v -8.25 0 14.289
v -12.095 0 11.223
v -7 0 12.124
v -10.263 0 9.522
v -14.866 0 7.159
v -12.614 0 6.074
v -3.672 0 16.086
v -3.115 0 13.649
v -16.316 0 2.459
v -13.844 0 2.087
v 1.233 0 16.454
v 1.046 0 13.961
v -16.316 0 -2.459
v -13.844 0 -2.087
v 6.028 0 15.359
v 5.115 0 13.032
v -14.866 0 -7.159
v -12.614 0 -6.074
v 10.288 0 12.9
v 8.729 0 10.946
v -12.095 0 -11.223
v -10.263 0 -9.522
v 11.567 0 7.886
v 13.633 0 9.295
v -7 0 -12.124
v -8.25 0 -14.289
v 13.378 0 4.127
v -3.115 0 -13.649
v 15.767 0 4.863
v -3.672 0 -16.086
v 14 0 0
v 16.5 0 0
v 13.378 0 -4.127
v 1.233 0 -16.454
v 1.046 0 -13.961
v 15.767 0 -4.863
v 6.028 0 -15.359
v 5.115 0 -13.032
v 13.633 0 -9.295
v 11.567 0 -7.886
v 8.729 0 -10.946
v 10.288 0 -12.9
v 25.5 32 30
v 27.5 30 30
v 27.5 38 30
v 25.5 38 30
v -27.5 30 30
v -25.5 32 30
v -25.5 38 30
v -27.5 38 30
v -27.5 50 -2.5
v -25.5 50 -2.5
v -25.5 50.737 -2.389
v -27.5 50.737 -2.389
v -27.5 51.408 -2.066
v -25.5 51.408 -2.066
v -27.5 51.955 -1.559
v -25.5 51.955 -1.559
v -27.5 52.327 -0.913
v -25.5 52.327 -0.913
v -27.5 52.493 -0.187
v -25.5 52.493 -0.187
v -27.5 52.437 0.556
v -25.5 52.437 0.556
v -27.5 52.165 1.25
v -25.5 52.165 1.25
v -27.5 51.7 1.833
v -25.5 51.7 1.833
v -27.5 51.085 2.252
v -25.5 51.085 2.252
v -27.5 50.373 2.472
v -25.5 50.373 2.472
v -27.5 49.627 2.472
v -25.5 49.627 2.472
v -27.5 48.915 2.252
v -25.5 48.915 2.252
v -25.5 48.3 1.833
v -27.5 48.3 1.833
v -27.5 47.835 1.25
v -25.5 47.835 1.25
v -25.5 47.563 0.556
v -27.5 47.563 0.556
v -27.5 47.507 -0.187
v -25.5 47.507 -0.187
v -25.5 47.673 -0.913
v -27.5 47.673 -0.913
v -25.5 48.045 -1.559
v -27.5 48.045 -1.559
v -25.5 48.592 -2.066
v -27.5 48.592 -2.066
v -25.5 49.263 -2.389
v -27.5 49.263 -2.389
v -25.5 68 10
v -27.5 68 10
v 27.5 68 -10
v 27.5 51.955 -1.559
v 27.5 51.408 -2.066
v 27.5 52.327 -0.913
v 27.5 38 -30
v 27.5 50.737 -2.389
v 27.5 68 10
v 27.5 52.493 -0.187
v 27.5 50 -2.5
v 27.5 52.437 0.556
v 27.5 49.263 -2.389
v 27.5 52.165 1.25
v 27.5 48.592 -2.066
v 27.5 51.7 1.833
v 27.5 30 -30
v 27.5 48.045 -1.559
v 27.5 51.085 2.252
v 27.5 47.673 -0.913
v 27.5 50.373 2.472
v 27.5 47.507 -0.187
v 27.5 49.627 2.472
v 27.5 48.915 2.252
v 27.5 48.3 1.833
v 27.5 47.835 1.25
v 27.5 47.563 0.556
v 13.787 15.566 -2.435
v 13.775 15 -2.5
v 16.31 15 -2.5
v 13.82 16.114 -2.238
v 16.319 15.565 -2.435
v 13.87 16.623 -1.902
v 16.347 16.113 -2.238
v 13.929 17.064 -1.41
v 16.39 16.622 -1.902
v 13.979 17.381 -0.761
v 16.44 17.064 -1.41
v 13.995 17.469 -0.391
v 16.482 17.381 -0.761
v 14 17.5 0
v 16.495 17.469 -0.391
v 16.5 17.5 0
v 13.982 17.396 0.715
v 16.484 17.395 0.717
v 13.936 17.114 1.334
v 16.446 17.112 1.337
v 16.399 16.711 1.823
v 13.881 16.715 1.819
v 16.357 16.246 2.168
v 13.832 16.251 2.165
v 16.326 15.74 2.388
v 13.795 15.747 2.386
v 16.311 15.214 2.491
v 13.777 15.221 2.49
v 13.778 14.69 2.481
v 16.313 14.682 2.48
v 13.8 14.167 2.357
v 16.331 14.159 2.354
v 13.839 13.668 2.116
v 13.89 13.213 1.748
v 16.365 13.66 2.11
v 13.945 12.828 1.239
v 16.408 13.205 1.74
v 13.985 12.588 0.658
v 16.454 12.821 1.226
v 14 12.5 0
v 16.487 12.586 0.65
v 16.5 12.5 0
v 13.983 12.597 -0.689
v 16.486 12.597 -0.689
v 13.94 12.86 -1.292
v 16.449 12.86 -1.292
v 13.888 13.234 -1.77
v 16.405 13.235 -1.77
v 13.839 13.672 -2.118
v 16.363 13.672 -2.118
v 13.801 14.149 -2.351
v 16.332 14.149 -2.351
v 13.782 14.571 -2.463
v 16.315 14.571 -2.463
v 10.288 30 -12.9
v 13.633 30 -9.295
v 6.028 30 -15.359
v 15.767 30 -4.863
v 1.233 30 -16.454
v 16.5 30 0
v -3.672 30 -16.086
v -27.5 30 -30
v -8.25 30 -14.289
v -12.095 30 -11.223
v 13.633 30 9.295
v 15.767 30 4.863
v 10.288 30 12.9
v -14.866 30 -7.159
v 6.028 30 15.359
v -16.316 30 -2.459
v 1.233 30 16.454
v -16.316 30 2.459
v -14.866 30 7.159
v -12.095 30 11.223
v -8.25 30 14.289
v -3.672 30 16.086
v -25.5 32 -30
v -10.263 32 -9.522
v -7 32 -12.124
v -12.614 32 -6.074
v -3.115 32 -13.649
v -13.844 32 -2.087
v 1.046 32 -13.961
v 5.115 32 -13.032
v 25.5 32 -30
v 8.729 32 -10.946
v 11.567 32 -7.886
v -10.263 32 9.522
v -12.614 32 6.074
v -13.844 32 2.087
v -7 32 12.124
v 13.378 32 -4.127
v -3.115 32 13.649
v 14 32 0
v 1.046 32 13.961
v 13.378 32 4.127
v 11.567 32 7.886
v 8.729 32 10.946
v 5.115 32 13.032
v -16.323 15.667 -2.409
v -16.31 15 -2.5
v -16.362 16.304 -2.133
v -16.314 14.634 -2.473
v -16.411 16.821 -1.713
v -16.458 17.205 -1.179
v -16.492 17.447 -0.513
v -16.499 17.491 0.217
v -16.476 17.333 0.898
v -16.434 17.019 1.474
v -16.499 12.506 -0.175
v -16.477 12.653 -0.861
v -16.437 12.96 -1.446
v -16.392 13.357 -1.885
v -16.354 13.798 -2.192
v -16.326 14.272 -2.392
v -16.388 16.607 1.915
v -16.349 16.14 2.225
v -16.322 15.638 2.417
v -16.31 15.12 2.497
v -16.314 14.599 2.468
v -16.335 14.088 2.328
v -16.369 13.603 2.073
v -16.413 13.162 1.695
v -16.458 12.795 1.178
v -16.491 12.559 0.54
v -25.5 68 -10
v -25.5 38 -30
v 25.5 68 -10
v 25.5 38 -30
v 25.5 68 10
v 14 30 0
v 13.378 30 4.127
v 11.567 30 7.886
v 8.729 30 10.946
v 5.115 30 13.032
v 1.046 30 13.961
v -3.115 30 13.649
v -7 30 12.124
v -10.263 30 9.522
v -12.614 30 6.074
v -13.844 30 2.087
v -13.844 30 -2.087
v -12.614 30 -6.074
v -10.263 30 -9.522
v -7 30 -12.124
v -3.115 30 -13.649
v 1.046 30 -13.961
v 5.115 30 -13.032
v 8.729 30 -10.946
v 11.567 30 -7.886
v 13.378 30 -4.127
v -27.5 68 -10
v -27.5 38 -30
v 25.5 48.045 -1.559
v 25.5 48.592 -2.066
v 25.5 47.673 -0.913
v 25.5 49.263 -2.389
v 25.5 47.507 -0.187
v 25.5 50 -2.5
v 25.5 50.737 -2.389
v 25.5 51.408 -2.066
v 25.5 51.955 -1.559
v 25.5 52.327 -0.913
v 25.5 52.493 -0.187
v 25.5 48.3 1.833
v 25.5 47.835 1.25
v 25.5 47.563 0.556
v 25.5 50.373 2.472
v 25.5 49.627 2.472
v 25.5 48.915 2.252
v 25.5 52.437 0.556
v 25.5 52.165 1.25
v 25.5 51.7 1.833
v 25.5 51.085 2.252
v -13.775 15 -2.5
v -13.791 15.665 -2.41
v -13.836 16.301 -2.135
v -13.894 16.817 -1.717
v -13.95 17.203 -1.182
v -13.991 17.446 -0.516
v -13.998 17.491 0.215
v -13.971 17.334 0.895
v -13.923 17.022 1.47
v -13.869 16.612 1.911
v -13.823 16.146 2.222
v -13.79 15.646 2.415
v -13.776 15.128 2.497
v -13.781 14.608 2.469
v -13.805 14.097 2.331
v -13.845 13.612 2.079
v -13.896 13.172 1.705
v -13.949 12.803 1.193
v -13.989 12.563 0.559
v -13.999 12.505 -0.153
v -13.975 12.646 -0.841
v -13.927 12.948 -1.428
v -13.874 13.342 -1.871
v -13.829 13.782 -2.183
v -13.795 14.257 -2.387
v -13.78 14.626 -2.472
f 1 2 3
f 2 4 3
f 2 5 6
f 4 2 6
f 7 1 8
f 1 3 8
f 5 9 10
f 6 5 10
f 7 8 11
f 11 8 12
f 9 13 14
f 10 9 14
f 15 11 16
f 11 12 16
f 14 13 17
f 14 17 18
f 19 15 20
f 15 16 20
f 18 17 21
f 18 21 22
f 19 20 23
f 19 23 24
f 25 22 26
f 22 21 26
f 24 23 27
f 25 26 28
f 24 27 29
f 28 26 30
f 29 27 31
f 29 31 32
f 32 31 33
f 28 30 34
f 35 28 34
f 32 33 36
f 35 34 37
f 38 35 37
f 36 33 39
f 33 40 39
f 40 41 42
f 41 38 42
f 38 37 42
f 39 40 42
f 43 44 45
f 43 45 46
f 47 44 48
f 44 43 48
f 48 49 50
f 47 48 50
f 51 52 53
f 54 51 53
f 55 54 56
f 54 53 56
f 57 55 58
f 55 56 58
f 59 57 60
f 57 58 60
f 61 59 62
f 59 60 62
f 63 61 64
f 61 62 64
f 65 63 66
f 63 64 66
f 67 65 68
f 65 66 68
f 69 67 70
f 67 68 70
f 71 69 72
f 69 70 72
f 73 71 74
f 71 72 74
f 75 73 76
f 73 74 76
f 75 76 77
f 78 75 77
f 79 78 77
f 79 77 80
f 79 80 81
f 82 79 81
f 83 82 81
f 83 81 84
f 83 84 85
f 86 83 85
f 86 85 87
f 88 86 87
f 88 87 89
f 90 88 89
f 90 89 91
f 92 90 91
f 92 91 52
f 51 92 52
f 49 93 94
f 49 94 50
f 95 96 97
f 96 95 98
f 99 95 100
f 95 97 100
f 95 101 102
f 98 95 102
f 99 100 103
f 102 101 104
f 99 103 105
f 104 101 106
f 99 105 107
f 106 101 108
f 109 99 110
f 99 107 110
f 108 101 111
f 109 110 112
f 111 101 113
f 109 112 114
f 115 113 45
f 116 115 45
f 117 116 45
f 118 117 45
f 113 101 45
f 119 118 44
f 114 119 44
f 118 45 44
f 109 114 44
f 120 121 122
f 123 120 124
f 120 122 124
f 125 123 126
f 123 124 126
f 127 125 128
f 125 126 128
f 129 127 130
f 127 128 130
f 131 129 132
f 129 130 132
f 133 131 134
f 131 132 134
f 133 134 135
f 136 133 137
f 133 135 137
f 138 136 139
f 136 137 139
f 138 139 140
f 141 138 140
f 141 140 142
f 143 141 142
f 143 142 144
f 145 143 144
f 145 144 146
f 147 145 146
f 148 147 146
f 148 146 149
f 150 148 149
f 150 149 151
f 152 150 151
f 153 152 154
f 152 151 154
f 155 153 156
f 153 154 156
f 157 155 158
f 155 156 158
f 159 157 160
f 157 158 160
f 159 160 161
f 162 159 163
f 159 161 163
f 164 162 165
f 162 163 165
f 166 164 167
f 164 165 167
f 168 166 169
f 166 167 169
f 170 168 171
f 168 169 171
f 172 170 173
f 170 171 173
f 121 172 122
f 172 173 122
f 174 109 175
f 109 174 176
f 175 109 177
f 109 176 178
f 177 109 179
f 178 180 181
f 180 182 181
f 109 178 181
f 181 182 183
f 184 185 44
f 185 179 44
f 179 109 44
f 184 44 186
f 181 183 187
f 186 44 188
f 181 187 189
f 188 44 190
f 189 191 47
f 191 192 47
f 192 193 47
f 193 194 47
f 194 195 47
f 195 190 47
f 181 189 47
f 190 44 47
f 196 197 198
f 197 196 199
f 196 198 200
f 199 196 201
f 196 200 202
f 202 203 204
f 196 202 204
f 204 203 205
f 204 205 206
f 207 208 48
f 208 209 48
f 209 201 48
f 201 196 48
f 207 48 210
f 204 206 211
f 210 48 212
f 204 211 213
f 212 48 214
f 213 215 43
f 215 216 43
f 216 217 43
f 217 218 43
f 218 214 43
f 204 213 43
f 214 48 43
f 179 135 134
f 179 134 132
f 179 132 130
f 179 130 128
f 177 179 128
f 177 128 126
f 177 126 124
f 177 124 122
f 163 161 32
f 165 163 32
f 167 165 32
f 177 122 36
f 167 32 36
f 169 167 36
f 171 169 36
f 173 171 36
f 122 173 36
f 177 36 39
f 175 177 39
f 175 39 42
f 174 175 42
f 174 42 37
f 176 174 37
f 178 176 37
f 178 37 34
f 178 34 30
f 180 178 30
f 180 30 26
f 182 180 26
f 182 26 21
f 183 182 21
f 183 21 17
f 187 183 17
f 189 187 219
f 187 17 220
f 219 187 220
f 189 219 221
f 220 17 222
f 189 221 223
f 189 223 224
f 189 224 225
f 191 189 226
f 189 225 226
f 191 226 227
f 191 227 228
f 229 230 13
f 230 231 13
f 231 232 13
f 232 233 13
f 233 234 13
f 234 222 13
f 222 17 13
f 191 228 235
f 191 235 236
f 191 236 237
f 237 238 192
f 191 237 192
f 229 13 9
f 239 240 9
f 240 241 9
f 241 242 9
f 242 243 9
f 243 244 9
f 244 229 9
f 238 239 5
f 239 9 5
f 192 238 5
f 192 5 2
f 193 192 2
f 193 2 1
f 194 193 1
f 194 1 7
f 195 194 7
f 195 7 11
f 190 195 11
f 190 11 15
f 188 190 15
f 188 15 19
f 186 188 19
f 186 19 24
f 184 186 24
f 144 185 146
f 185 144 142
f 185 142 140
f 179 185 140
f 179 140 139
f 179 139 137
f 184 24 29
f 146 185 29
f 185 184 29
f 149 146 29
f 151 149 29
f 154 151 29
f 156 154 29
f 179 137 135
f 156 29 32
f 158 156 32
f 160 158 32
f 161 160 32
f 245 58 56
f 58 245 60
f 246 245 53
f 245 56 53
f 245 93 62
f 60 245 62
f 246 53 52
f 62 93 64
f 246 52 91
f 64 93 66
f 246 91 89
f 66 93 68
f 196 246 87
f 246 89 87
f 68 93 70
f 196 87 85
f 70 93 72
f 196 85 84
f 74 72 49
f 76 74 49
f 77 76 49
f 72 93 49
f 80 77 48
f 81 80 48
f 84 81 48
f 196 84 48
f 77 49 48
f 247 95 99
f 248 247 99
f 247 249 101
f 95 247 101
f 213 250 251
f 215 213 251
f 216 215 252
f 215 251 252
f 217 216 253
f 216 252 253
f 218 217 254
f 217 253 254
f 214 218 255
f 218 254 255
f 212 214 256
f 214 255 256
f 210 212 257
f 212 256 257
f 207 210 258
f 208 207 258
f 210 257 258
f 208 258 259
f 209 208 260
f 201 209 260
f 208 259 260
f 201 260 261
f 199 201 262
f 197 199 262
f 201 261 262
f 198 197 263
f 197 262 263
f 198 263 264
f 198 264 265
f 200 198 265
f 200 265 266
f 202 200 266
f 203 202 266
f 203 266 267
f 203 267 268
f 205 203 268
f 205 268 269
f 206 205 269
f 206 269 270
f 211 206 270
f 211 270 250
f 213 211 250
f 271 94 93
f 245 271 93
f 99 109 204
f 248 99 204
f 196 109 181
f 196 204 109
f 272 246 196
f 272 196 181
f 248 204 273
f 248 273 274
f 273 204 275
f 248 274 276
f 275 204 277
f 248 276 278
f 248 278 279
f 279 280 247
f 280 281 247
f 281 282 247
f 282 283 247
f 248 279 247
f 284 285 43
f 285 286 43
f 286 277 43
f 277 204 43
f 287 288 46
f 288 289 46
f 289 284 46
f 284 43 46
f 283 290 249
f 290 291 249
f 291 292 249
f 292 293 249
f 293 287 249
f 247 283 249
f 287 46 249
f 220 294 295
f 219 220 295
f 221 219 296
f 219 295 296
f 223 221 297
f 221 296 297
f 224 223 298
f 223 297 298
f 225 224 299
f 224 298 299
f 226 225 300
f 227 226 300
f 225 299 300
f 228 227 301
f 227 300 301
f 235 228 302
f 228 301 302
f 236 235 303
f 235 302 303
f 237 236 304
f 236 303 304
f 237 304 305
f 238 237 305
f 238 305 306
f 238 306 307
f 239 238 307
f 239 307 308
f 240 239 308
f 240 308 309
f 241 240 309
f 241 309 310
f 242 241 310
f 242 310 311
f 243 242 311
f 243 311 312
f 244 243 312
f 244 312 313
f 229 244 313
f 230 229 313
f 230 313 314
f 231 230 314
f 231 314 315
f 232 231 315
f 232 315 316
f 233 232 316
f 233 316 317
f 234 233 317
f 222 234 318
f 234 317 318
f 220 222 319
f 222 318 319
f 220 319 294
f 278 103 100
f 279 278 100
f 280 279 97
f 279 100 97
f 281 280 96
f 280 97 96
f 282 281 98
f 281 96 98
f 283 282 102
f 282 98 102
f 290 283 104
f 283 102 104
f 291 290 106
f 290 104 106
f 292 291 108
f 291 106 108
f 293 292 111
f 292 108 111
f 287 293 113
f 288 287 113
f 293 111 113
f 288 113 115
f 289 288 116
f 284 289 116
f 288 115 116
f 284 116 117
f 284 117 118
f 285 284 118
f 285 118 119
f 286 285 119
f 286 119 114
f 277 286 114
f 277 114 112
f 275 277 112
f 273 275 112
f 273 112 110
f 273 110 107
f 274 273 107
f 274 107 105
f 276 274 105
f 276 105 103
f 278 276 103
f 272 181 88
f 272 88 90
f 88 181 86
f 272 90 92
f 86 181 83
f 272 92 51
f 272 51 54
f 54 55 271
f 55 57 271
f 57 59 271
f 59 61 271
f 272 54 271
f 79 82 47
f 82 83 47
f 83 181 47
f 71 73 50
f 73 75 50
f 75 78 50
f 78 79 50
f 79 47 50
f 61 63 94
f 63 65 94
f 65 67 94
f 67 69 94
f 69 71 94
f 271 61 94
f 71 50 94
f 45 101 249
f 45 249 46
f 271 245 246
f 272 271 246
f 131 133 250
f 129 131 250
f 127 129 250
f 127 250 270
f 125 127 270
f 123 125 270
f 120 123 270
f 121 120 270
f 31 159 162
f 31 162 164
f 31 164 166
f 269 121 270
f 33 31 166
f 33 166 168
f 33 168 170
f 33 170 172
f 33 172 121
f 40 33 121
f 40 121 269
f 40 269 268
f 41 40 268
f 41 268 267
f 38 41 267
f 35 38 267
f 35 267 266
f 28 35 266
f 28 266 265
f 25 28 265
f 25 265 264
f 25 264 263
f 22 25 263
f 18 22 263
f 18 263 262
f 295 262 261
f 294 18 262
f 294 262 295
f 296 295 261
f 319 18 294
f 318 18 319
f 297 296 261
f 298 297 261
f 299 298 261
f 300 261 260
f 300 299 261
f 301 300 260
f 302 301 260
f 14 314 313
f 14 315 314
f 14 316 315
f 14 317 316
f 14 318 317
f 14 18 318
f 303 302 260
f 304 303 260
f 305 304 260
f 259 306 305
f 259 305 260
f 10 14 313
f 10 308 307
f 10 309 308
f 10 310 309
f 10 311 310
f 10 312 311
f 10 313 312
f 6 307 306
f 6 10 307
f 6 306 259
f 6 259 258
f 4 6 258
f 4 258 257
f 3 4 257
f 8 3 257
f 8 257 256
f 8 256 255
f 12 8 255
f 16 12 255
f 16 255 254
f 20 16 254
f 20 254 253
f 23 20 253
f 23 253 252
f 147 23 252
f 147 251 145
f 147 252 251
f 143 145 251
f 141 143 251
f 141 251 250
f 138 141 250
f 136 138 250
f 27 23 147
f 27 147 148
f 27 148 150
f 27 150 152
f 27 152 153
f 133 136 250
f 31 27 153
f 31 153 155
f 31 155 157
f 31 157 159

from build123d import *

# Parameters (mm, degrees)
SKETCH_1_R           = 16.5
SKETCH_1_R_2         = 14
EXTRUDE_1_DEPTH      = 30
EXTRUDE_2_DEPTH      = 30
EXTRUDE_2_DEPTH_BACK = 30
SKETCH_3_R           = 14
CUT_EXTRUDE_1_DEPTH  = 50
SKETCH_4_R           = 2.5
CUT_EXTRUDE_2_DEPTH  = 93.460802506


with BuildPart() as part:
    # 草图1 → 凸台-拉伸1 (new body)
    with BuildSketch(Plane(origin=(0, 0, 0), x_dir=(1, 0, 0), z_dir=(0, 1, 0))):
        Circle(SKETCH_1_R)
        Circle(SKETCH_1_R_2, mode=Mode.SUBTRACT)
    extrude(amount=EXTRUDE_1_DEPTH)

    # 草图2 → 凸台-拉伸2 (add, two sides: drawn at the far end of the back side and taken through both)
    with BuildSketch(Plane.XY.offset(-EXTRUDE_2_DEPTH_BACK)):
        Polygon((27.5, 30), (-27.5, 30), (-27.5, 68), (-25.5, 68), (-25.5, 32), (25.5, 32), (25.5, 68), (27.5, 68), align=None)
    extrude(amount=EXTRUDE_2_DEPTH + EXTRUDE_2_DEPTH_BACK)

    # 草图3 → 切除-拉伸1 (cut)
    with BuildSketch(Plane.XZ.offset(-30)):
        Circle(SKETCH_3_R)
    extrude(amount=-CUT_EXTRUDE_1_DEPTH, mode=Mode.SUBTRACT)

    # 草图4 → 切除-拉伸2 (cut, through all)
    with BuildSketch(Plane(origin=(27.5, 0, 0), x_dir=(0, 0, -1), z_dir=(1, 0, 0))):
        with Locations((0, 50)):
            Circle(SKETCH_4_R)
        with Locations((0, 15)):
            Circle(SKETCH_4_R)
        Polygon((-30, 38), (-30, 68), (-10, 68), align=None)
        Polygon((30, 68), (10, 68), (30, 38), align=None)
    extrude(amount=-CUT_EXTRUDE_2_DEPTH, mode=Mode.SUBTRACT)


solid = part.part
